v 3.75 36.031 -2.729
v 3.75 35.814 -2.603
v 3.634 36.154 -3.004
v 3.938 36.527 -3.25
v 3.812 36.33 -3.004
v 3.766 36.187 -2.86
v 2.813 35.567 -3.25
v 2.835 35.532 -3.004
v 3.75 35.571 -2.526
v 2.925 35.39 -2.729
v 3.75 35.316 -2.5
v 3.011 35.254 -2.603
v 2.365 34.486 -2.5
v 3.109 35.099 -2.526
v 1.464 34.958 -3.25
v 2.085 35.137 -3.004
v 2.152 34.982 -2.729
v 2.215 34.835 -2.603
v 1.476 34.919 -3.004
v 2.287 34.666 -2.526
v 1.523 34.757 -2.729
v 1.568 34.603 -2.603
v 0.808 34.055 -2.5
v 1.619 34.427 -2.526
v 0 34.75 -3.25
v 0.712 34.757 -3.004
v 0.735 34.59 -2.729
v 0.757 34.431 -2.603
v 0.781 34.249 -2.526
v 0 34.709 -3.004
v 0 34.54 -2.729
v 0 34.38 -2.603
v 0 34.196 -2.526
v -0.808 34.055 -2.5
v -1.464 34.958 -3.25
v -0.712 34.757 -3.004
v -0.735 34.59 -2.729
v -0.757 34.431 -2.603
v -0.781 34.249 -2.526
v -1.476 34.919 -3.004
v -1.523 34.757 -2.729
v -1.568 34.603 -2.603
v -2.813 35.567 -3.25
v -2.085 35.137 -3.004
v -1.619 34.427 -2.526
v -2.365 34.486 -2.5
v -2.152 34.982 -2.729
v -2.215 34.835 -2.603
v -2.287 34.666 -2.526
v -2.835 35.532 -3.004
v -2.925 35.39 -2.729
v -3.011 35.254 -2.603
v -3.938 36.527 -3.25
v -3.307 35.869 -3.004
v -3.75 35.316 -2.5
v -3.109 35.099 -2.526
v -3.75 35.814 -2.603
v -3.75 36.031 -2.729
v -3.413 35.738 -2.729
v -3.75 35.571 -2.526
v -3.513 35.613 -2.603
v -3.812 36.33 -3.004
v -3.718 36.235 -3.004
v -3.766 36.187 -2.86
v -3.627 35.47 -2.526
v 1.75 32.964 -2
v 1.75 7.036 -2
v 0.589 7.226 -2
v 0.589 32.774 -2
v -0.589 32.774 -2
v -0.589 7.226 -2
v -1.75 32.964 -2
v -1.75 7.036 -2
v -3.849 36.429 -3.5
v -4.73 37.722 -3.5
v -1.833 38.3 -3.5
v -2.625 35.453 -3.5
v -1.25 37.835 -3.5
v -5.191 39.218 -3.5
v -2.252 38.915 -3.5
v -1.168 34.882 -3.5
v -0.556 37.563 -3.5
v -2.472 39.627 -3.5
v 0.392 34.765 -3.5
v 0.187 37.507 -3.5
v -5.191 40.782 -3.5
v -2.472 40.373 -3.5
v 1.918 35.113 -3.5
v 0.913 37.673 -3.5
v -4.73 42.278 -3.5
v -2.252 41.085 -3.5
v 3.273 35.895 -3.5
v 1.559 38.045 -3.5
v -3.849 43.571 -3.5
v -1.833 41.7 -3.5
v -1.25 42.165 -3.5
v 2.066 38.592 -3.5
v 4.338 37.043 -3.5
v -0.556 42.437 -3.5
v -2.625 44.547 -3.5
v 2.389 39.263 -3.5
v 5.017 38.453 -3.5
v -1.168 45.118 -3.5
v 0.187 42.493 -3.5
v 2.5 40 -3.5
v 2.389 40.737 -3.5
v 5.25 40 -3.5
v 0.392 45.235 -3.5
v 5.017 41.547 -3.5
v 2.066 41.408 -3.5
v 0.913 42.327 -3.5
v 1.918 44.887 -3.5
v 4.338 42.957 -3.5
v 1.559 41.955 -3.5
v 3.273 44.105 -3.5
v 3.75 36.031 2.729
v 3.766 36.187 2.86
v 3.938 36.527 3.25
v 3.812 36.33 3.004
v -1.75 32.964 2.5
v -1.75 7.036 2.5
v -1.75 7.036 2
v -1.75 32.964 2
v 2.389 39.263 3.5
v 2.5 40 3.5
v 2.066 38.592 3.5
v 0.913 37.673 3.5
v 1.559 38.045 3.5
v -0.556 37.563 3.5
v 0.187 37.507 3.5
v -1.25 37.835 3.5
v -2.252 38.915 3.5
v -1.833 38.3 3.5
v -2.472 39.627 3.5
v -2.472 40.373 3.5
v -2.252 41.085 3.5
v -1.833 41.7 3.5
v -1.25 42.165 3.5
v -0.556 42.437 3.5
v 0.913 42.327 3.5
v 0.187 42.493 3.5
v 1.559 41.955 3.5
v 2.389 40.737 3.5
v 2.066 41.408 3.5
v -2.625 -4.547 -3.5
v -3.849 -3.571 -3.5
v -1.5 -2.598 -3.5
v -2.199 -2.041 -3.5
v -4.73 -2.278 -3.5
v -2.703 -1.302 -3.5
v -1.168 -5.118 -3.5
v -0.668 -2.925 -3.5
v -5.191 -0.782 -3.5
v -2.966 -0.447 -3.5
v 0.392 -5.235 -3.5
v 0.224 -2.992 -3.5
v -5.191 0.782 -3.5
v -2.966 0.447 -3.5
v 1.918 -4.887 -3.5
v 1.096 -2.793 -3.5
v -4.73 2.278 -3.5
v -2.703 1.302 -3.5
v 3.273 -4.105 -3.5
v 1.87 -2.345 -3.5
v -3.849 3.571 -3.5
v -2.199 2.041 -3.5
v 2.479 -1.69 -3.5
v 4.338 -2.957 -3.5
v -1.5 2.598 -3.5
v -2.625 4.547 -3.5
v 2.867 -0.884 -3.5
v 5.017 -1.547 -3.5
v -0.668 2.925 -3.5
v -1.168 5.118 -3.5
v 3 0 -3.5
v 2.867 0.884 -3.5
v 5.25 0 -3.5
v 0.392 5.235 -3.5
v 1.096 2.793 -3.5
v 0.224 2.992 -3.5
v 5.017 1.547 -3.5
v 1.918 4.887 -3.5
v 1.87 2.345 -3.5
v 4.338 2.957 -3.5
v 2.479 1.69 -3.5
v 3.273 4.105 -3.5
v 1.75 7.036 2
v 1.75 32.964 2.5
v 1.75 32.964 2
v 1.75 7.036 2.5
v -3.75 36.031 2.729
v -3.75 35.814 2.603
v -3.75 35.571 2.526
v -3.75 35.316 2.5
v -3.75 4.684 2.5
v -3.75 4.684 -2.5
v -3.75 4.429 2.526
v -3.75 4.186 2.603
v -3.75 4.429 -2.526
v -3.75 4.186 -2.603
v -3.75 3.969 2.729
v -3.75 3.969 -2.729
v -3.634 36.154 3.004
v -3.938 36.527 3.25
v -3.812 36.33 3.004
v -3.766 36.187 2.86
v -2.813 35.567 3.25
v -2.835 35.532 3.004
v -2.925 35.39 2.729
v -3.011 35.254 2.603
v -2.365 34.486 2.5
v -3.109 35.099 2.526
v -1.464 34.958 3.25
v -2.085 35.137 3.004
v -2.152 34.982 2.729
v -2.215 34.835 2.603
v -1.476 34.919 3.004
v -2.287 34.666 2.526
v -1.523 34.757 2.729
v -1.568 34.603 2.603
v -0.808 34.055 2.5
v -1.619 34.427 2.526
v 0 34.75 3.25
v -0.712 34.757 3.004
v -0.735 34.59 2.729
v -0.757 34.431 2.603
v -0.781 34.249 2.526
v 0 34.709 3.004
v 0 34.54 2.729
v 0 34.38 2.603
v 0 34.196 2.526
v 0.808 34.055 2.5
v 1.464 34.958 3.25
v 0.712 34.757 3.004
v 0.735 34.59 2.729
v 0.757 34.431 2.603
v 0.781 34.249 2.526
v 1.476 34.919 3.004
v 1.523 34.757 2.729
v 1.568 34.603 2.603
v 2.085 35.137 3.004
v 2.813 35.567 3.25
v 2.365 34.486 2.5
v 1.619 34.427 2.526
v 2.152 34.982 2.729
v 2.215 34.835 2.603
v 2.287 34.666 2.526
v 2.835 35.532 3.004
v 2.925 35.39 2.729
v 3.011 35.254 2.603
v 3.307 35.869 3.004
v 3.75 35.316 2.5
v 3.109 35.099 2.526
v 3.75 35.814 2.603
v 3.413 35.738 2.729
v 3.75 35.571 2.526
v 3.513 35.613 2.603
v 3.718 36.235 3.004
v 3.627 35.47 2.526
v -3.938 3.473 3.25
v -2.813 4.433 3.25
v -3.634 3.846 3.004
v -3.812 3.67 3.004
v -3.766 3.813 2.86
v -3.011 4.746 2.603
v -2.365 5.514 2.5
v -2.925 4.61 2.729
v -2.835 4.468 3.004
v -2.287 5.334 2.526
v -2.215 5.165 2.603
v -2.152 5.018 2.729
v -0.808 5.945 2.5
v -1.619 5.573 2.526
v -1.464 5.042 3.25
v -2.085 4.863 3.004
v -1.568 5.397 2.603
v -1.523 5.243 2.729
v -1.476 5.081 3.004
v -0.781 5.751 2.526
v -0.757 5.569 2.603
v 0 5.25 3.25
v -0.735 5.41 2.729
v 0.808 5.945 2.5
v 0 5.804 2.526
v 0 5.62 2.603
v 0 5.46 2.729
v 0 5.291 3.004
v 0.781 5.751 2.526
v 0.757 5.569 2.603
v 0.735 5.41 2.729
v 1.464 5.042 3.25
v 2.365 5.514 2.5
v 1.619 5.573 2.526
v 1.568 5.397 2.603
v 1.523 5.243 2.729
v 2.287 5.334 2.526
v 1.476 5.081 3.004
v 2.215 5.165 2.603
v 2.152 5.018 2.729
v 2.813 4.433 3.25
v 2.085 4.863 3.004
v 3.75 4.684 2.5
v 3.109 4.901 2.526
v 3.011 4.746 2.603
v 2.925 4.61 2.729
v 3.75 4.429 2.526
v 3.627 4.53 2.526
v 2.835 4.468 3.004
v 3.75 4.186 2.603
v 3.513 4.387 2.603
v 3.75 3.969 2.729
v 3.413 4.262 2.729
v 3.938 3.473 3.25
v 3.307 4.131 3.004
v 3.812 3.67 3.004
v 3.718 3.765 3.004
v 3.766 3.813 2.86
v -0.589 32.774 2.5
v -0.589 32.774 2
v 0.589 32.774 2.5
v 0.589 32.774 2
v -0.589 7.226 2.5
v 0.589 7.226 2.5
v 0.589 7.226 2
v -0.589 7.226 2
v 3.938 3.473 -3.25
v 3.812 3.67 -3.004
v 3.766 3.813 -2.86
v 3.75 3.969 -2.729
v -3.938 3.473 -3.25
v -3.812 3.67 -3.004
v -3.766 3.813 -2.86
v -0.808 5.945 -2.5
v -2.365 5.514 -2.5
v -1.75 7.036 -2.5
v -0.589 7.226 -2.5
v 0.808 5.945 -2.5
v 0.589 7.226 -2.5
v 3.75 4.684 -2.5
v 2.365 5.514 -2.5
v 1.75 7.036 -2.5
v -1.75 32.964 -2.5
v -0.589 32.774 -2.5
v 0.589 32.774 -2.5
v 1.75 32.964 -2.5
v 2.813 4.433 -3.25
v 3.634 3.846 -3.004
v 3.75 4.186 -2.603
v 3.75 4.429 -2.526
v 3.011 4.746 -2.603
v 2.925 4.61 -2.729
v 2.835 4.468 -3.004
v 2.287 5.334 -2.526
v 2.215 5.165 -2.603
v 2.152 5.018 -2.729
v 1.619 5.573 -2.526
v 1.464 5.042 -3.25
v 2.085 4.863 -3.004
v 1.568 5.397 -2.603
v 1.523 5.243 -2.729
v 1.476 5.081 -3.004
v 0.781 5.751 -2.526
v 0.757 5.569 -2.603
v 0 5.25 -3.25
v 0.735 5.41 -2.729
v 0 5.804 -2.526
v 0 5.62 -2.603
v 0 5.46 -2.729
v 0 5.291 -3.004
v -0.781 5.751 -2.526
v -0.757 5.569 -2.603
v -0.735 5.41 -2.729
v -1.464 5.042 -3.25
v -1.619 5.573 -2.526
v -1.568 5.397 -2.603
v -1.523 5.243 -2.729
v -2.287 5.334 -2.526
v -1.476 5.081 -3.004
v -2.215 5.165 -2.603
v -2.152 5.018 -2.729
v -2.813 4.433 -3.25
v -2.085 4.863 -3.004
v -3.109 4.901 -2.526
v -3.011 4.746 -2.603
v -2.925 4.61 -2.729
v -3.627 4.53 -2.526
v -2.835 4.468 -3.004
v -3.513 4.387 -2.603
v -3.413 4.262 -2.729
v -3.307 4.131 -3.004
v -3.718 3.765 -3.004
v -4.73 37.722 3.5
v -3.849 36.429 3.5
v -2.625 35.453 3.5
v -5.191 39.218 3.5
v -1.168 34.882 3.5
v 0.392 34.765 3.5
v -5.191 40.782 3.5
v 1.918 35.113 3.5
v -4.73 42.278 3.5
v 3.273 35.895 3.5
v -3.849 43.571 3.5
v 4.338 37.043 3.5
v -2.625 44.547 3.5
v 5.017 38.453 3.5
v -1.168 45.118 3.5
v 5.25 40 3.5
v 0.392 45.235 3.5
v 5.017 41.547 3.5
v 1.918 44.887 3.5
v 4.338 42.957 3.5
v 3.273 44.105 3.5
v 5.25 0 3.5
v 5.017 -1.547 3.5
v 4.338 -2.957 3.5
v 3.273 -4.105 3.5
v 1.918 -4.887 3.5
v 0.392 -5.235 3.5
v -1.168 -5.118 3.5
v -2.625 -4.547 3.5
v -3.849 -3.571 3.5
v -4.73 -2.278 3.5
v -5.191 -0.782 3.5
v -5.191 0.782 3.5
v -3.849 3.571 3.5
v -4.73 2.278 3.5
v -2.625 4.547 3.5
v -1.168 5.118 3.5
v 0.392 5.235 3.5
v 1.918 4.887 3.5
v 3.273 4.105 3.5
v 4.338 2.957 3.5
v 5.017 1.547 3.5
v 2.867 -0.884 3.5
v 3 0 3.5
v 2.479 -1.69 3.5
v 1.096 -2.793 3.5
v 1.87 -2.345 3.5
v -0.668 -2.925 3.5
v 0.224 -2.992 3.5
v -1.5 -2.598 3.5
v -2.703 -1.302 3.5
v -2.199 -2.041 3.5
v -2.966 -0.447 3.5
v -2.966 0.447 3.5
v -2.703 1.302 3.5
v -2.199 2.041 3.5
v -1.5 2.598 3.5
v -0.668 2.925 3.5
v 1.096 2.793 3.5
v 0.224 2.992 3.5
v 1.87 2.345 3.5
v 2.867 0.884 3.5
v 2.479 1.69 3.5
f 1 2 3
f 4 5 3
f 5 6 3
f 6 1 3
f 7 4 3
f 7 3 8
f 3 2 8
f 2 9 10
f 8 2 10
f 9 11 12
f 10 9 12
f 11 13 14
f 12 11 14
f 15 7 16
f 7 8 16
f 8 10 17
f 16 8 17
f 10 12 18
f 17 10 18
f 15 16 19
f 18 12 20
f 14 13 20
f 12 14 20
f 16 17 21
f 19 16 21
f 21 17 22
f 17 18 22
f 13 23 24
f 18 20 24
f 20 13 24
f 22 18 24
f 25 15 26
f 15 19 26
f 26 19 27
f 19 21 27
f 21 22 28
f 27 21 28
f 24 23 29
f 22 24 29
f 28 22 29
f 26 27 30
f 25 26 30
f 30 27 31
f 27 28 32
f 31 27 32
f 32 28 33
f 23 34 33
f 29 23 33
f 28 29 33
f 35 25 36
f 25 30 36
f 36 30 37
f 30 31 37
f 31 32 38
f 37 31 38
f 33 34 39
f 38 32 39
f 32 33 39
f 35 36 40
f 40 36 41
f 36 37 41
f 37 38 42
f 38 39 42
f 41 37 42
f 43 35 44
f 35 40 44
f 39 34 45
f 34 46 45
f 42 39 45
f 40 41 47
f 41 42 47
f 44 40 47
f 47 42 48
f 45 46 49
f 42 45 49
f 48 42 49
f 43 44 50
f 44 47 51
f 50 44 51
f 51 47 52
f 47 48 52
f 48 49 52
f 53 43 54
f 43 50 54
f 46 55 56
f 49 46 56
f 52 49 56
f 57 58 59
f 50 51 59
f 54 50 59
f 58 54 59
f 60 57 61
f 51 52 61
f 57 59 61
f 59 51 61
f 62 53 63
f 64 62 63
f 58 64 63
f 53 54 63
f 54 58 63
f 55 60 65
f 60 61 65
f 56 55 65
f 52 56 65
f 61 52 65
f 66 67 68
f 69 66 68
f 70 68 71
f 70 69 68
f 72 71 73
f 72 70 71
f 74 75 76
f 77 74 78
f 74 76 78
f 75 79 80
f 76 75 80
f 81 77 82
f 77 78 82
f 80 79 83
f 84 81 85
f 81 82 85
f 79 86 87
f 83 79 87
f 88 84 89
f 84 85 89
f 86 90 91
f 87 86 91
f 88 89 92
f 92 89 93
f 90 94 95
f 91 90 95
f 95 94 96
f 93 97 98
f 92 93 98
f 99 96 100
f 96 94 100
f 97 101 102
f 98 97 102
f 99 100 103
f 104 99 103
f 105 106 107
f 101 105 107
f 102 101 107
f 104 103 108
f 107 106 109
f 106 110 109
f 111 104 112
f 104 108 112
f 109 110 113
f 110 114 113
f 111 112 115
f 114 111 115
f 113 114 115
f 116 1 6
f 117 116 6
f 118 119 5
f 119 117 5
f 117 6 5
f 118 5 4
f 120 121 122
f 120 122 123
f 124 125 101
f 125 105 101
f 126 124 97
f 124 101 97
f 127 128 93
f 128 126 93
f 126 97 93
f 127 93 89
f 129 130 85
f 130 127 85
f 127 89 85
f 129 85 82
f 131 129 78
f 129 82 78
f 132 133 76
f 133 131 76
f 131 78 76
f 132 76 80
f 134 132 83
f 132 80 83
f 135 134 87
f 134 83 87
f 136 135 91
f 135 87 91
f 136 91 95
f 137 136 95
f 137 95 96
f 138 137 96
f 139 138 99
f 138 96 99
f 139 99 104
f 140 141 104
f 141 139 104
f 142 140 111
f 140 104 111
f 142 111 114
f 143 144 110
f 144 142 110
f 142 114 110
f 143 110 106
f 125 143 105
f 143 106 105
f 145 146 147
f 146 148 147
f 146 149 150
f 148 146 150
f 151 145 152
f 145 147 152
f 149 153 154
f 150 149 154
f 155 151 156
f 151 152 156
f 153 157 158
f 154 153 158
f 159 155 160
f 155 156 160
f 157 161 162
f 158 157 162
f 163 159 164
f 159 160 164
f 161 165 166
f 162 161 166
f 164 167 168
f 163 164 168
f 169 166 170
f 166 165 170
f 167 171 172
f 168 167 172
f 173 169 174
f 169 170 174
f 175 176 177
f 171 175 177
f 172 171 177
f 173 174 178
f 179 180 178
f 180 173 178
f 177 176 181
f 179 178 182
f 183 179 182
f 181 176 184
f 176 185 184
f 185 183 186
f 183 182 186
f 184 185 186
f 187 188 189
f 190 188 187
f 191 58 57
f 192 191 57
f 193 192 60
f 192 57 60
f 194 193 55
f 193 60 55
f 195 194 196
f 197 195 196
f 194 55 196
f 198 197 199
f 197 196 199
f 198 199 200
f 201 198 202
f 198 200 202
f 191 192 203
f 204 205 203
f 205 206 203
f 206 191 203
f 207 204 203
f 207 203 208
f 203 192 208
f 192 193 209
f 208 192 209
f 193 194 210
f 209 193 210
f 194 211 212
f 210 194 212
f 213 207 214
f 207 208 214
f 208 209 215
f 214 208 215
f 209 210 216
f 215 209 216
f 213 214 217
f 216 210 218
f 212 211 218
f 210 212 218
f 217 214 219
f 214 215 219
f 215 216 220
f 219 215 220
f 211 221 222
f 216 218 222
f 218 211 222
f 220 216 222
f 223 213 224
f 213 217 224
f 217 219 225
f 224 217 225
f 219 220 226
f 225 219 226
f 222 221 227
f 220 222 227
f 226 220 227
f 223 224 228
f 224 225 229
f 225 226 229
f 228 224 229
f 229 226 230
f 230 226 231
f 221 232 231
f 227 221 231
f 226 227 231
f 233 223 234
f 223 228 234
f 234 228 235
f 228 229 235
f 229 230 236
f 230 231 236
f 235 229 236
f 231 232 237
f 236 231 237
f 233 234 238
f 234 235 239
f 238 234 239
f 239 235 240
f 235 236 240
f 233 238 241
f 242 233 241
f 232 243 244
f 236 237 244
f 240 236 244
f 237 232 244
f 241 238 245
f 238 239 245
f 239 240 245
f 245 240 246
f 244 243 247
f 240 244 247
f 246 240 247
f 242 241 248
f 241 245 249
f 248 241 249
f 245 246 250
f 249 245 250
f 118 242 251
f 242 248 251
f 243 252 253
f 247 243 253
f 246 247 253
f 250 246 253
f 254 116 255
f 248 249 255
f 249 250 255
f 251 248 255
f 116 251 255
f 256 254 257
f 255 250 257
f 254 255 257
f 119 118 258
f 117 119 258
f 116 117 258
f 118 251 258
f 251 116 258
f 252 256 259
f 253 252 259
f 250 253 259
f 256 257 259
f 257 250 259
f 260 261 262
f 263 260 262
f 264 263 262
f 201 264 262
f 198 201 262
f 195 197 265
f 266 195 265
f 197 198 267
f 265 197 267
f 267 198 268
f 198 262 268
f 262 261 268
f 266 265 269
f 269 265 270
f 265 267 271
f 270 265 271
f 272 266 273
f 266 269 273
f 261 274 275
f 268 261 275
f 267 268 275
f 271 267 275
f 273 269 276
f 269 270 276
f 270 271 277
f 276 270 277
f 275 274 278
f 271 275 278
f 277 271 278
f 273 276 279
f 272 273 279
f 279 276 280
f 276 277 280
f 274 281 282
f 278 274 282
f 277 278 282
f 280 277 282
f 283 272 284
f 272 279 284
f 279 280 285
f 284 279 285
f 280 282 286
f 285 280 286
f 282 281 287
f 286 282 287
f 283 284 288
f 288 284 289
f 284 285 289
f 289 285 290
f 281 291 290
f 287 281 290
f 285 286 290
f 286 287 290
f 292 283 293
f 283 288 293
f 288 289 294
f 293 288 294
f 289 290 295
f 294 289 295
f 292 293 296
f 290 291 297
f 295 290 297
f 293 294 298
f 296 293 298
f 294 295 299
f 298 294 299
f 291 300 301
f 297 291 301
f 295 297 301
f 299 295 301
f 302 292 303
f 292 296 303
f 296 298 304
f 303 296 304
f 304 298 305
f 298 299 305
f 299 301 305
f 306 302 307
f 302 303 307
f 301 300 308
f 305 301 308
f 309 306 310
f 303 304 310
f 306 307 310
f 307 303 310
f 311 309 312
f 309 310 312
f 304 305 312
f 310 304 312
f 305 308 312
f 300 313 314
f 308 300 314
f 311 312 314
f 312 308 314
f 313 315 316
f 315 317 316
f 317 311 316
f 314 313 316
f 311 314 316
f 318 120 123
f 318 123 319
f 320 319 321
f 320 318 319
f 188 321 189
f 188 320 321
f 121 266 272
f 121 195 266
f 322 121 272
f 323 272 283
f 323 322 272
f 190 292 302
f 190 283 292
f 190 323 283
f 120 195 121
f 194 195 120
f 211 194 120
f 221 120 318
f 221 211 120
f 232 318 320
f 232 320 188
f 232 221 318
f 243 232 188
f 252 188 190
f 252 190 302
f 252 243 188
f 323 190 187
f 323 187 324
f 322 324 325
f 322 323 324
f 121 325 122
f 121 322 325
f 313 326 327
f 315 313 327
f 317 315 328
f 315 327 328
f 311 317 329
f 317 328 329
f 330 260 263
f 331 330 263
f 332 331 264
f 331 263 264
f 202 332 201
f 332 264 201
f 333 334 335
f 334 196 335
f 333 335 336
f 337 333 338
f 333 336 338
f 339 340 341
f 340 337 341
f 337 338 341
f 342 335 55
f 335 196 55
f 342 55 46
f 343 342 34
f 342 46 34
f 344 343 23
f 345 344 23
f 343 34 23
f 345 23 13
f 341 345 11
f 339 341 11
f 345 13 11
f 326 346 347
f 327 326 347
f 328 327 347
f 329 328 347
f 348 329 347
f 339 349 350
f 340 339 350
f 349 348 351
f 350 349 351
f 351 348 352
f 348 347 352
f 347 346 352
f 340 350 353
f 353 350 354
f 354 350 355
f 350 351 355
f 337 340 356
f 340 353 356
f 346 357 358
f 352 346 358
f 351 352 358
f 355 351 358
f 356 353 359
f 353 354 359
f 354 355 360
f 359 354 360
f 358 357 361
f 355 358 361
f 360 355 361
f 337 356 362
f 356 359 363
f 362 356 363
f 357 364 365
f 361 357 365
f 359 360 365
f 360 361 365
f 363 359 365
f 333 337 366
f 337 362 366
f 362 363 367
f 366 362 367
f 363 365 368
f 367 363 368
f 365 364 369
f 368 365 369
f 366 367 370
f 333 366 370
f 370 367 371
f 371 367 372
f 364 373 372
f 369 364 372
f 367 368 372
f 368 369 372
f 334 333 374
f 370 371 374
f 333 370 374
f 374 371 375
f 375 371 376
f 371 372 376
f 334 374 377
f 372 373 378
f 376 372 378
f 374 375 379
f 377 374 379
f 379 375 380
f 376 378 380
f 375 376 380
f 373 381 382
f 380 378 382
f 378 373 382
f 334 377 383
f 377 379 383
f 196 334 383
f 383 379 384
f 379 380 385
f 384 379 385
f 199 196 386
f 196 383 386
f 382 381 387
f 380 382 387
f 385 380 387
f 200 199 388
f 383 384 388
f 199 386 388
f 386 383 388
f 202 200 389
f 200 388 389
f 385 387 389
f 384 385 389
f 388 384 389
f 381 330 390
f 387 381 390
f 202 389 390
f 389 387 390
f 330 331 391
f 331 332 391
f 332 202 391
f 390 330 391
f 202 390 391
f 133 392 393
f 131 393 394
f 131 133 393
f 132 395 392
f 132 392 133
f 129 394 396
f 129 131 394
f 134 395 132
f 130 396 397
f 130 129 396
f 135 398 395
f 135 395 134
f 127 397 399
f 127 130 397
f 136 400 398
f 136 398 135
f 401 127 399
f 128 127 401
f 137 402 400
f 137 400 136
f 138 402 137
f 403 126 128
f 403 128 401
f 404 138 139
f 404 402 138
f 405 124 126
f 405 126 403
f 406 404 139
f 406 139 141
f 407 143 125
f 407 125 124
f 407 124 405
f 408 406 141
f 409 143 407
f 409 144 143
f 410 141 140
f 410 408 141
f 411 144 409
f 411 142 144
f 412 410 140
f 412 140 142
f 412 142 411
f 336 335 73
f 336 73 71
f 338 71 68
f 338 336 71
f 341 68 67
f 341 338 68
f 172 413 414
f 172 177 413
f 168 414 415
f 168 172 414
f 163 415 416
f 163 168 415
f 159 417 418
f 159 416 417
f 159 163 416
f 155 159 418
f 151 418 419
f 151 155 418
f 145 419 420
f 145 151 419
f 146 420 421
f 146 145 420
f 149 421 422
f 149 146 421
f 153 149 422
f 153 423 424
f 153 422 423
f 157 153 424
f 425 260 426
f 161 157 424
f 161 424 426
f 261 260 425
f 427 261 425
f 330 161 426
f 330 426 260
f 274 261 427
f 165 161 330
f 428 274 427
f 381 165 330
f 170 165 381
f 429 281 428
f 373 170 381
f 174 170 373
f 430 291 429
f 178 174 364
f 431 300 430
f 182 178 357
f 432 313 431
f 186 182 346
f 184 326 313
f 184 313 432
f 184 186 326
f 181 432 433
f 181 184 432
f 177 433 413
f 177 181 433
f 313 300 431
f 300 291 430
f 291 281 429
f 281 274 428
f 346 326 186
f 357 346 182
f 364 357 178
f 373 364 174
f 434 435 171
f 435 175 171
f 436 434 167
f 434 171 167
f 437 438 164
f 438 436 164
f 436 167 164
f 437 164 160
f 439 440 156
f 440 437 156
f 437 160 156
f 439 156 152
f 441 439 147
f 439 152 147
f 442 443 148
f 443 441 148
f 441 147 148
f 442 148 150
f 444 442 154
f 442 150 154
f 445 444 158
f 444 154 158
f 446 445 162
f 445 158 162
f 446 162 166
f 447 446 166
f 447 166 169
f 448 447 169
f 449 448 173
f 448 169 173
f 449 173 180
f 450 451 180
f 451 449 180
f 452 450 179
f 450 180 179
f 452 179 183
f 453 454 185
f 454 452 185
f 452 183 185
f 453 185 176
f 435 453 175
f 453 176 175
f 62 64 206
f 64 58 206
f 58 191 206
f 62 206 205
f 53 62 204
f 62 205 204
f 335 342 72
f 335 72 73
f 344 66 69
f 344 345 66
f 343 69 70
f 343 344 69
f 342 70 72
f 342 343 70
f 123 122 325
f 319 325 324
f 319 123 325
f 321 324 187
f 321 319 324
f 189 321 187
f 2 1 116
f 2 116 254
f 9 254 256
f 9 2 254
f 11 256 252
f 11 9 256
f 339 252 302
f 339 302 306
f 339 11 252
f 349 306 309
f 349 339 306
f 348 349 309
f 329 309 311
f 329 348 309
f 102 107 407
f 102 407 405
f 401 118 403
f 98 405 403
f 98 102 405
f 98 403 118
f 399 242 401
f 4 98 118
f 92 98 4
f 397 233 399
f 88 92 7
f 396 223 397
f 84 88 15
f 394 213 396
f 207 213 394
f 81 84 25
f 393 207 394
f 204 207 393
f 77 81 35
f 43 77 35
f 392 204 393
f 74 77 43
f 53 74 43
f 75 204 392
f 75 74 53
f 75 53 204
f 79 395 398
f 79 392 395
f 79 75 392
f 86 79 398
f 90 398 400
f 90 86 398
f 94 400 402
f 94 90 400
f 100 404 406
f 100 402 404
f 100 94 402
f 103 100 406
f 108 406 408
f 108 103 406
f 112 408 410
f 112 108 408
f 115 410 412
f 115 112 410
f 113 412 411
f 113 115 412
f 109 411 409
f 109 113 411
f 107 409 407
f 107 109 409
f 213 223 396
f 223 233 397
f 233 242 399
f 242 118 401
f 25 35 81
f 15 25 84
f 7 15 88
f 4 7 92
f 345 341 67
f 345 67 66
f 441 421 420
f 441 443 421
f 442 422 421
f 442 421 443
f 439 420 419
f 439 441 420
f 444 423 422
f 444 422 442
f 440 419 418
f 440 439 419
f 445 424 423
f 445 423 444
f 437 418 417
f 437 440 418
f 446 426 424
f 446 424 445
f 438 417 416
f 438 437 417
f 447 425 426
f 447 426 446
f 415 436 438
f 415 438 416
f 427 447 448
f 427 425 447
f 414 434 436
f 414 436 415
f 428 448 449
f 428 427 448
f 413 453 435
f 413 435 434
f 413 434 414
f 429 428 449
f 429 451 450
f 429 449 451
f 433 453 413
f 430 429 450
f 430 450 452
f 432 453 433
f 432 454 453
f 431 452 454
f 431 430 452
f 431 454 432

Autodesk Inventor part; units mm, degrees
ref_plane "YZ Plane" through (0, 0, 0) normal (1, 0, 0) x (0, 1, 0)
ref_plane "XZ Plane" through (0, 0, 0) normal (0, 1, 0) x (-1, 0, 0)
ref_plane "XY Plane" through (0, 0, 0) normal (0, 0, 1) x (1, 0, 0)
sketch "Sketch1" plane through (0, 0, 0) normal (0, 0, 1) x (1, 0, 0)
  line L0 (0, 0) -> (0, 40) construction
  circle A0 centre (0, 40) radius 2.5
  circle A1 centre (0, 40) radius 5.25
  circle A2 centre (0, 0) radius 3
  circle A3 centre (0, 0) radius 5.25
  dimension "d0" = 40
  dimension "d1" = 5
  dimension "d2" = 10.5
  dimension "d3" = 6
  dimension "d4" = 10.5
extrude "Extrusion1" add sketch "Sketch1" along normal mid plane 7
sketch "Sketch2" plane through (0, 0, 0) normal (0, 0, 1) x (1, 0, 0)
  circle A0 centre (0, 40) radius 2.5 projected
  circle A1 centre (0, 40) radius 5.25 projected
  circle A2 centre (0, 0) radius 3 projected
  circle A3 centre (0, 0) radius 5.25 projected
  circle A4 centre (0, 0) radius 3 projected
  line L0 (0, 40) -> (0, 0) construction
  line L1 (-3.75, 36.3258) -> (-3.75, 3.6742)
  line L2 (3.75, 36.3258) -> (3.75, 3.6742)
  point P0 (-3.75, 40)
  point P1 (-3.75, 0)
  point P2 (3.75, 40)
  point P3 (3.75, 0)
  dimension "d7" = 3.75
extrude "Extrusion2" add sketch "Sketch2" along normal mid plane 5 contours A1 L2 A3 L1
sketch "Sketch3" plane through (0, 0, 2.5) normal (0, 0, 1) x (1, 0, 0)
  line L0 (-3.75, 36.3258) -> (-3.75, 3.6742) projected
  line L1 (-3.75, 36.3258) -> (-3.75, 3.6742) projected
  arc A0 (3.75, 3.6742) -> (-3.75, 3.6742) centre (0, 0) ccw projected
  line L2 (3.75, 3.6742) -> (3.75, 36.3258) projected
  arc A1 (-3.75, 36.3258) -> (3.75, 36.3258) centre (0, 40) ccw projected
  line L3 (1.75, 32.9644) -> (1.75, 7.0356)
  arc A2 (1.75, 7.0356) -> (-1.75, 7.0356) centre (0, 0) ccw
  line L4 (-1.75, 7.0356) -> (-1.75, 32.9644)
  arc A3 (-1.75, 32.9644) -> (1.75, 32.9644) centre (0, 40) ccw
  dimension "d10" = 2
extrude "Extrusion3" cut sketch "Sketch3" against normal blind 0.5 contours L3 A2 L4 A3
mirror "Mirror1" about plane through (0, 0, 0) normal (0, 0, 1) of "Extrusion3"
fillet "Fillet1" radius 0.75 8 edges at (0, 34.75, 2.5) (3.75, 36.3258, 0) (0, 34.75, -2.5) (-3.75, 36.3258, 0) (3.75, 3.6742, 0) (0, 5.25, -2.5) (-3.75, 3.6742, 0) (0, 5.25, 2.5)
properties part number "Component 6 (Connecting Rod)"
